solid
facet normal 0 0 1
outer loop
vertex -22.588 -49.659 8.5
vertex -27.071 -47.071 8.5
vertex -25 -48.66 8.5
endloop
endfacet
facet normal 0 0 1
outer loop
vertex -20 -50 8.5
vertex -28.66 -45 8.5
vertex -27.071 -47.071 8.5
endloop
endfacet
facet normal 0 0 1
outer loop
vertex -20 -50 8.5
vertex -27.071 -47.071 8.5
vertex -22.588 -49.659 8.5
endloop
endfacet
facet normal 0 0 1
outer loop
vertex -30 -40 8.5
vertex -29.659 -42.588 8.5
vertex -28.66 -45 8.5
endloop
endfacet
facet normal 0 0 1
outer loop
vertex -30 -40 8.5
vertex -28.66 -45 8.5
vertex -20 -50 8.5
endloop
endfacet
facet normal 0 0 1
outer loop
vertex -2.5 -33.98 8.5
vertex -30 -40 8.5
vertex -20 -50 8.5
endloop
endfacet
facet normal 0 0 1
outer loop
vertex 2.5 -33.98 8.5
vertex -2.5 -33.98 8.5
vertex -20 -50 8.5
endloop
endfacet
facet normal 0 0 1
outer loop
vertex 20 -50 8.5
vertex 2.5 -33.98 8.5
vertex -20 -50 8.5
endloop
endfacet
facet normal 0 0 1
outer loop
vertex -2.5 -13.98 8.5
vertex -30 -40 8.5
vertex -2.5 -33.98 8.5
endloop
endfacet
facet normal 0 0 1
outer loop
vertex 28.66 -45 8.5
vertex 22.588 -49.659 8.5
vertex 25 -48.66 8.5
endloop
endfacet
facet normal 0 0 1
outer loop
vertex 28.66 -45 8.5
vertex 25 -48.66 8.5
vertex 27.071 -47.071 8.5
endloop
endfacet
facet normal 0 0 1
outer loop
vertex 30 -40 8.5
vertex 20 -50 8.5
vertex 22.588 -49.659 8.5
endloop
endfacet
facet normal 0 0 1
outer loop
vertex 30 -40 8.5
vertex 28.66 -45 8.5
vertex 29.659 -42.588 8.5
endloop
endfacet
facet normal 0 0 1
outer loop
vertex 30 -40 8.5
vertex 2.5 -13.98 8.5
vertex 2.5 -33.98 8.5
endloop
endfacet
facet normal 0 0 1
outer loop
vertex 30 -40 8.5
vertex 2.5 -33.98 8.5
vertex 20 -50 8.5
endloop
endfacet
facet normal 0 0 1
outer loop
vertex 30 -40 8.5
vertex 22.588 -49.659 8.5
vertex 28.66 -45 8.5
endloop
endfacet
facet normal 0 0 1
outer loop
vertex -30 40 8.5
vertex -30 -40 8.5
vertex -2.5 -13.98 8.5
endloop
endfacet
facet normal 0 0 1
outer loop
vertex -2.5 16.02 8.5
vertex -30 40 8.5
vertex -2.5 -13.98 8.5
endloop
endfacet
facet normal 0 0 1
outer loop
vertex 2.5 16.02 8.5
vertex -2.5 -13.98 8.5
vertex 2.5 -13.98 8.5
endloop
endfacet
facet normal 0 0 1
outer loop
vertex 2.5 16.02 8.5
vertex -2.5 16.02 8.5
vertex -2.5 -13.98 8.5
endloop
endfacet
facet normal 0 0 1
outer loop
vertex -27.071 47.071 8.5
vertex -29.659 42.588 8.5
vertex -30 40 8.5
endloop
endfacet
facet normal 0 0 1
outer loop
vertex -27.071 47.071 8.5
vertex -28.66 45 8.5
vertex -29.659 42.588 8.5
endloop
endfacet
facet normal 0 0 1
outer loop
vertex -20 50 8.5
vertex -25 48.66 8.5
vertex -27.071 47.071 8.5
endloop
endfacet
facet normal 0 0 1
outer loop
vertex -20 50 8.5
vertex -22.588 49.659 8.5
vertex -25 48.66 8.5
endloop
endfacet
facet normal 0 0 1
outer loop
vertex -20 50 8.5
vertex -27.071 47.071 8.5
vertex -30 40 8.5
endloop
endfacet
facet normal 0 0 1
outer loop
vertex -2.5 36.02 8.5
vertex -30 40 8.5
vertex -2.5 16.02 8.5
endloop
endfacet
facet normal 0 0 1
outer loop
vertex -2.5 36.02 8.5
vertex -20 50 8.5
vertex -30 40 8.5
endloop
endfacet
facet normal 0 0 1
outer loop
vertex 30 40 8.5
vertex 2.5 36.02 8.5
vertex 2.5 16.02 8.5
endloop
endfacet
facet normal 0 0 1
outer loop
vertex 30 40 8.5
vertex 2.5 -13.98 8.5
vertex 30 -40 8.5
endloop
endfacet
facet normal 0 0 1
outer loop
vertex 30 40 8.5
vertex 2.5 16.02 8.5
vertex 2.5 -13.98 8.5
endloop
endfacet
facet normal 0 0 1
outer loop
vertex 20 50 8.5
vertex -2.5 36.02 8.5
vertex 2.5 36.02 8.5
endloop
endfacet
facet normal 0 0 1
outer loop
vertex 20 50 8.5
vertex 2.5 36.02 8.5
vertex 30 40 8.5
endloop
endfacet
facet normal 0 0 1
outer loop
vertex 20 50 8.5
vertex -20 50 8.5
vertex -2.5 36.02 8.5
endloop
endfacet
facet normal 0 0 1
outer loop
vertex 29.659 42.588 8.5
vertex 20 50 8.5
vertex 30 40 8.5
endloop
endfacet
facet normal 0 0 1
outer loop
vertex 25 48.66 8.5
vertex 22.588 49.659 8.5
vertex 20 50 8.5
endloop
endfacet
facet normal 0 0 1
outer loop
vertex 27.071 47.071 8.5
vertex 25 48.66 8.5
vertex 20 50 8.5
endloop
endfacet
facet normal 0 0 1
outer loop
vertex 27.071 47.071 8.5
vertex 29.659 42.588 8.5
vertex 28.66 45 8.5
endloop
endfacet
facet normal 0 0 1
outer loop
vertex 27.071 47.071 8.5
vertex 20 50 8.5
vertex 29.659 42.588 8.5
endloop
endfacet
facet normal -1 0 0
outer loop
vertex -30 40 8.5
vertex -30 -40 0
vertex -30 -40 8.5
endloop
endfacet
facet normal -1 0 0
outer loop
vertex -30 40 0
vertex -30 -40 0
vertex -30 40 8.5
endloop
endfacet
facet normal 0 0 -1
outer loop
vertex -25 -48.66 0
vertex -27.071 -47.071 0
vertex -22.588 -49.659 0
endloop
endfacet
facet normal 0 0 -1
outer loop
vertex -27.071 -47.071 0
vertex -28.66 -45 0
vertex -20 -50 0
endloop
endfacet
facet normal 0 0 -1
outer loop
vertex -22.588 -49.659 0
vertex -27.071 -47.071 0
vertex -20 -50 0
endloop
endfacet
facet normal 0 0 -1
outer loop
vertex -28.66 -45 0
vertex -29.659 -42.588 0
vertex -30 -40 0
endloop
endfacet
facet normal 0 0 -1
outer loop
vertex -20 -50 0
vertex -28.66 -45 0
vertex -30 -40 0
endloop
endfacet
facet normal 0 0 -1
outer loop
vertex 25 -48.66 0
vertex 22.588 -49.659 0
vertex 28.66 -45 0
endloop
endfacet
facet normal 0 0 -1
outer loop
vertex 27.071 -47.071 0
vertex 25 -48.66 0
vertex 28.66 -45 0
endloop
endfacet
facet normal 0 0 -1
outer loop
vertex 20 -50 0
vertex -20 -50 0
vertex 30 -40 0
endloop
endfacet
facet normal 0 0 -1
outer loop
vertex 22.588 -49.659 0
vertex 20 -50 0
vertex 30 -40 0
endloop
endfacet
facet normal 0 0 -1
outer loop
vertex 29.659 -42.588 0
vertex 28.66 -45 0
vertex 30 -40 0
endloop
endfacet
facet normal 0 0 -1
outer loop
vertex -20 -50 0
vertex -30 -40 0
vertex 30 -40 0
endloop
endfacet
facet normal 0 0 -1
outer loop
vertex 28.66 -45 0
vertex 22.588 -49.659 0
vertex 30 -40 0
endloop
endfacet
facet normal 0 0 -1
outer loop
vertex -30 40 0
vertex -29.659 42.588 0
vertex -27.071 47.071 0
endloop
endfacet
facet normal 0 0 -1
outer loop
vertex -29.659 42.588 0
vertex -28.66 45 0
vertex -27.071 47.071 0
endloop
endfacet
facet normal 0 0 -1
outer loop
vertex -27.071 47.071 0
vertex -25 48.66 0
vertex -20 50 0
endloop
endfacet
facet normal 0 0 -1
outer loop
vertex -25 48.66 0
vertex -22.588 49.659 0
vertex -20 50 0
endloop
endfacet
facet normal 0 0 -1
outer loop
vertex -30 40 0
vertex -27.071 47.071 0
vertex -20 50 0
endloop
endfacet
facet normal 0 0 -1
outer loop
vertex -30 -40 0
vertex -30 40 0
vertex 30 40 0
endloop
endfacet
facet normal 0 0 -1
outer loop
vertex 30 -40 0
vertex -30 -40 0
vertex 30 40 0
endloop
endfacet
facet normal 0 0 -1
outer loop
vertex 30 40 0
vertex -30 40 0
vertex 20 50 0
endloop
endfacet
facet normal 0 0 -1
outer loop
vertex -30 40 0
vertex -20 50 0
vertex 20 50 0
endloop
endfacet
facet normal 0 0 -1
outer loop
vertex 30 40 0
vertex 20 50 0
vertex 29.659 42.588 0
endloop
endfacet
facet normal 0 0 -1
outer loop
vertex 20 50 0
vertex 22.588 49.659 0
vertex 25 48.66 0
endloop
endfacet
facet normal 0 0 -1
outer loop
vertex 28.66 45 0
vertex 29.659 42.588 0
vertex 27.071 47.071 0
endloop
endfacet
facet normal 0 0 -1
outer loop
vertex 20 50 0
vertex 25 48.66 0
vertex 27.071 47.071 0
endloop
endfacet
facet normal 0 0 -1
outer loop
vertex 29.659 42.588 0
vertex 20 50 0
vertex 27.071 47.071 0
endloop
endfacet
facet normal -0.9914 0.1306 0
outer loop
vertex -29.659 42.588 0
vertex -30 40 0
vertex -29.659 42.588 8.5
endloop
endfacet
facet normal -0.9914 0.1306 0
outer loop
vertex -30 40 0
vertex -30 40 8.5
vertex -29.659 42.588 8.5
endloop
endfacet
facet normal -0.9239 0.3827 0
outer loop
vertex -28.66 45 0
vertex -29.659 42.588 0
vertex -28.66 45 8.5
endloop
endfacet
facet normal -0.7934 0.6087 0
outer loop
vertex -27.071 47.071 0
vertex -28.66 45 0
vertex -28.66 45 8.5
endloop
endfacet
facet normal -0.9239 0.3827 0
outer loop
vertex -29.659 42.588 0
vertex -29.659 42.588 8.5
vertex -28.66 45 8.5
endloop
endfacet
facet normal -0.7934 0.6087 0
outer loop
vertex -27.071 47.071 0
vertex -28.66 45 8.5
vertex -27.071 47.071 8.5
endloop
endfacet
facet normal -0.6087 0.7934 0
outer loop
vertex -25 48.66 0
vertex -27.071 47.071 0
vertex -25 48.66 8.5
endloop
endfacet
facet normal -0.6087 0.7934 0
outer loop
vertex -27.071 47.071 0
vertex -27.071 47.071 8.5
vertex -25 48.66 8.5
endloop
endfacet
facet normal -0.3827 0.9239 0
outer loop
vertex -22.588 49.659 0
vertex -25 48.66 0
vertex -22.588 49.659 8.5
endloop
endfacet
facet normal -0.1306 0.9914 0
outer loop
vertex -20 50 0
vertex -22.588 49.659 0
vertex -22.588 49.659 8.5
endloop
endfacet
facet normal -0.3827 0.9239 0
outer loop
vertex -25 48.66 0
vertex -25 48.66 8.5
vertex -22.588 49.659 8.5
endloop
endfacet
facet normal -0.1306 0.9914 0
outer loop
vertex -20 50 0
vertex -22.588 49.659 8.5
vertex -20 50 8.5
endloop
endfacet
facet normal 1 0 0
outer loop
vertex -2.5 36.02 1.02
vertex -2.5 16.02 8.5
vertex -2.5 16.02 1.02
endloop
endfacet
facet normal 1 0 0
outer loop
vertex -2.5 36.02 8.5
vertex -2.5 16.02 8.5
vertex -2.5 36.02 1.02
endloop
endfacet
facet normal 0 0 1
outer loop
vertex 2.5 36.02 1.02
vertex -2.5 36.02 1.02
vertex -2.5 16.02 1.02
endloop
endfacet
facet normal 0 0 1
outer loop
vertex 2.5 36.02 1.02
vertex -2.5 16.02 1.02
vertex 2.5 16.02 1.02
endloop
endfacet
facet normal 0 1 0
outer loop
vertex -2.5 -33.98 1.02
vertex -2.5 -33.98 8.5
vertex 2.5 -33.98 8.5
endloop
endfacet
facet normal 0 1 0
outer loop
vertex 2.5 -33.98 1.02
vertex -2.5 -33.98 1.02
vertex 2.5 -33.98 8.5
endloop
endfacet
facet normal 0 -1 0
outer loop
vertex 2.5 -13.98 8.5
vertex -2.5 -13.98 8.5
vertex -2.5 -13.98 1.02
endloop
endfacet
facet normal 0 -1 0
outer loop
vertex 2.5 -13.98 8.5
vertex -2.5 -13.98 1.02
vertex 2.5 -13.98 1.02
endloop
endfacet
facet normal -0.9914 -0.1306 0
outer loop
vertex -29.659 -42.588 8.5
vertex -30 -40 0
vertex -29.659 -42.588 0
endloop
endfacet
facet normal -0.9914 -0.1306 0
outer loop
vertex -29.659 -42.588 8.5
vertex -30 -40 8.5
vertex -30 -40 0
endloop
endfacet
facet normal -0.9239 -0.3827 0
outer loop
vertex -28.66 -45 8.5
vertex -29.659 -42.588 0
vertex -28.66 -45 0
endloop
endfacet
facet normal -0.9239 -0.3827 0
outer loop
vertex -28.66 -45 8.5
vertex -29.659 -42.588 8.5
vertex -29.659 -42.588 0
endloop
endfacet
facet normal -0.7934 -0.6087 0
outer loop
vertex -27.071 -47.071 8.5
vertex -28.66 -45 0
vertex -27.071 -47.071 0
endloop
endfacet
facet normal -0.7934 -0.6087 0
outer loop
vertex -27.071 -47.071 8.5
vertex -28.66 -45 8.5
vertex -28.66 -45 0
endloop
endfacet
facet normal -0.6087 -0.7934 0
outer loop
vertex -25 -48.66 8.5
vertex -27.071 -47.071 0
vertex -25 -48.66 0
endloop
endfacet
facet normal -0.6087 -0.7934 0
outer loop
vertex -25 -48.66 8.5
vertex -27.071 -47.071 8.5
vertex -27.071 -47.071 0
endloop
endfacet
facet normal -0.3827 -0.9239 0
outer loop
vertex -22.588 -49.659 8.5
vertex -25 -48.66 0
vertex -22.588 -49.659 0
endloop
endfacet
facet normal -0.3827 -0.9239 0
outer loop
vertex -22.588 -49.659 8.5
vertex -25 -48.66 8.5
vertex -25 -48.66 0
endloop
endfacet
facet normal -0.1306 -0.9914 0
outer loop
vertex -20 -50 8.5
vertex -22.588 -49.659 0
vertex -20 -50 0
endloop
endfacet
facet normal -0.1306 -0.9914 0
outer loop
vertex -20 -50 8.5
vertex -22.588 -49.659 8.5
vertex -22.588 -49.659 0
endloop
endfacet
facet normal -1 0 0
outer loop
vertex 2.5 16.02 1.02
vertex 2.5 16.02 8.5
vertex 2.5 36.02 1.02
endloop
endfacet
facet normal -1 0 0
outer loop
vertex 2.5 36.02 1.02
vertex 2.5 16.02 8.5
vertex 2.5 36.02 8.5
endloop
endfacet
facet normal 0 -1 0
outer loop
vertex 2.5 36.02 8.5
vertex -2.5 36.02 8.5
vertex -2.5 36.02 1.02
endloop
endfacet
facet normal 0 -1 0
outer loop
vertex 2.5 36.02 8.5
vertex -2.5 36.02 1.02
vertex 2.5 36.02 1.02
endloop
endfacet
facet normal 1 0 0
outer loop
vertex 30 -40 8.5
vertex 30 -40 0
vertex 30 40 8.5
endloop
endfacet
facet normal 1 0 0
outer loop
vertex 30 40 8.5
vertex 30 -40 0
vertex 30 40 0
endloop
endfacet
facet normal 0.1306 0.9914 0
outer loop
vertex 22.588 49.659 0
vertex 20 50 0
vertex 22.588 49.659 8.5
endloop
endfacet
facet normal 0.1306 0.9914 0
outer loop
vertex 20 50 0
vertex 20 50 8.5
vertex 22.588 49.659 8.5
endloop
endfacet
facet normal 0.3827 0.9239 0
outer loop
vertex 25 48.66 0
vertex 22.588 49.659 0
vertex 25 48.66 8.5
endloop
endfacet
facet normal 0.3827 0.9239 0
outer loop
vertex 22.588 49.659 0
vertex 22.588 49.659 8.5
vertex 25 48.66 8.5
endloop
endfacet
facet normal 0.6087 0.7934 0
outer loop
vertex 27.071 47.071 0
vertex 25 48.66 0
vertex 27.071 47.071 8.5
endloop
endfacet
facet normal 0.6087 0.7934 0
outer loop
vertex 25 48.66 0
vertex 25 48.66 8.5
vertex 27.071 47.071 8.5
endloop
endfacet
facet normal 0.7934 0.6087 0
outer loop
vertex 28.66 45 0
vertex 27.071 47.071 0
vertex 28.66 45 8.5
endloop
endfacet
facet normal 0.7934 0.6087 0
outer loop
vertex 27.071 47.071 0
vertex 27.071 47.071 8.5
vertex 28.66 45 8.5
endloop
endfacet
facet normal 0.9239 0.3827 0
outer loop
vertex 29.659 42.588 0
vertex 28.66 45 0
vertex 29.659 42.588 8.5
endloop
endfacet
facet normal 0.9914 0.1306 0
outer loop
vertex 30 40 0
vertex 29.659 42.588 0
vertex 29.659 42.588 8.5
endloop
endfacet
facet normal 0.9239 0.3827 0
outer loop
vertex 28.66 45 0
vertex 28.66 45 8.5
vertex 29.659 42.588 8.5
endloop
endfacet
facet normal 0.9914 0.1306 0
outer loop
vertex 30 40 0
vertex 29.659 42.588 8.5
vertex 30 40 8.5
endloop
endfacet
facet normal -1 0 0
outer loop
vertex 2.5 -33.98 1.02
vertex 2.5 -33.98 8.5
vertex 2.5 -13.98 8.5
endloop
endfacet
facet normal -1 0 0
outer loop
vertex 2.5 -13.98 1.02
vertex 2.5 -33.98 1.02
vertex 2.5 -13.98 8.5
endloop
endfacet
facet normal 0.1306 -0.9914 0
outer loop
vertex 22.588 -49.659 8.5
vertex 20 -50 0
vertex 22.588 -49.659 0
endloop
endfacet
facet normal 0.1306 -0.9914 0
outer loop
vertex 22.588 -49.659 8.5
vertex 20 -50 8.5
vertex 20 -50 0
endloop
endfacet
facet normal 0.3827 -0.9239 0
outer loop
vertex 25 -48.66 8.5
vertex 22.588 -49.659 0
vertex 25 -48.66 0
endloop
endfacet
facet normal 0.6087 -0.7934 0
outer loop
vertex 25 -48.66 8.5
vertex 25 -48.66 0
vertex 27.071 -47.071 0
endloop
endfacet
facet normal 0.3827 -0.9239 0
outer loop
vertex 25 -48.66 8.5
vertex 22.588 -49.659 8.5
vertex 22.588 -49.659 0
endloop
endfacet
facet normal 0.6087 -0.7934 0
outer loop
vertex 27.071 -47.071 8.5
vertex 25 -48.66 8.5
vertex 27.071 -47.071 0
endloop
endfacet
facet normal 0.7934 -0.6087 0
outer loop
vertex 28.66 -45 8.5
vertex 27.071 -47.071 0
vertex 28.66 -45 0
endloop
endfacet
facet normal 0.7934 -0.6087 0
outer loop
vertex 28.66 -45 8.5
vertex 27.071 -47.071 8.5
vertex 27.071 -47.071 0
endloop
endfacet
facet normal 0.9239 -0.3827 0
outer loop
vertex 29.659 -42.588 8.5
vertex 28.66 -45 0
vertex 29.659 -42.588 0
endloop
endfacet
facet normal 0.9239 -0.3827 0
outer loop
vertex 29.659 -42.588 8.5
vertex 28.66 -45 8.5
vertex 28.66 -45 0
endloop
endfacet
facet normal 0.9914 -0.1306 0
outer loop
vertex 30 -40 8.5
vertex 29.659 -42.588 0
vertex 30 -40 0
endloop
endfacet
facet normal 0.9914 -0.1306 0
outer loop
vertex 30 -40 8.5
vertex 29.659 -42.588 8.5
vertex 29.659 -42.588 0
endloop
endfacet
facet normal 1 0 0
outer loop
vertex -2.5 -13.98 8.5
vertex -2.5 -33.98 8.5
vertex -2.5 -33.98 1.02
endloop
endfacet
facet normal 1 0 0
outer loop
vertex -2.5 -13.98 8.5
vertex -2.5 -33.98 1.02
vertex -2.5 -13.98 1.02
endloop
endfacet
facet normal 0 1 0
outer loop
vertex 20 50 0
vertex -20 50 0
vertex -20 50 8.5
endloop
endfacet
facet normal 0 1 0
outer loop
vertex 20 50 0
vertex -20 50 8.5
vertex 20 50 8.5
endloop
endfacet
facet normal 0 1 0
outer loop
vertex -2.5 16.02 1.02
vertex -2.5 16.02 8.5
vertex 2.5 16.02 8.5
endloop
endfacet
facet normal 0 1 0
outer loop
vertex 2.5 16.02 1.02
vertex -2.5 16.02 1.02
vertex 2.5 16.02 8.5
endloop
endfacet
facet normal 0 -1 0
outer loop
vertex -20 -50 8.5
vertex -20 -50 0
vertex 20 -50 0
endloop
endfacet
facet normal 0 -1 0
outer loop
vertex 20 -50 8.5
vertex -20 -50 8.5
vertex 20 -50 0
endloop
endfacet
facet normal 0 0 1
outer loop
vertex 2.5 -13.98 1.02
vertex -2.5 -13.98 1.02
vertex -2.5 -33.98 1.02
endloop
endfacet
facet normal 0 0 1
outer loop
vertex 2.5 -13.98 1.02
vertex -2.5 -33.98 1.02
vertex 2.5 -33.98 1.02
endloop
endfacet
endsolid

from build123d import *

# Parameters (mm, degrees)
CROQUIS2_W              = 60
CROQUIS2_H              = 100
SALIENTE_EXTRUIR1_DEPTH = 8.5
CROQUIS4_W              = 5
CROQUIS4_H              = 20
CORTAR_EXTRUIR1_DEPTH   = 7.48
REDONDEO1_R             = 10
REDONDEO2_R             = 10


with BuildPart() as part:
    # Croquis2 → Saliente-Extruir1 (new body)
    with BuildSketch(Plane.XY):
        Rectangle(CROQUIS2_W, CROQUIS2_H)
    extrude(amount=SALIENTE_EXTRUIR1_DEPTH)

    # Croquis4 → Cortar-Extruir1 (cut)
    with BuildSketch(Plane.XY.offset(8.5)):
        with Locations((0, 26.02)):
            Rectangle(CROQUIS4_W, CROQUIS4_H)
        with Locations((0, -23.98)):
            Rectangle(CROQUIS4_W, CROQUIS4_H)
    extrude(amount=-CORTAR_EXTRUIR1_DEPTH, mode=Mode.SUBTRACT)

    # Redondeo1
    redondeo1_edges = [part.edges().sort_by_distance(p)[0] for p in [
        (-30, 50, 4.25),
    ]]
    fillet(redondeo1_edges, radius=REDONDEO1_R)

    # Redondeo2
    redondeo2_edges = [part.edges().sort_by_distance(p)[0] for p in [
        (30, -50, 4.25),
        (-30, -50, 4.25),
        (30, 50, 4.25),
    ]]
    fillet(redondeo2_edges, radius=REDONDEO2_R)


solid = part.part
